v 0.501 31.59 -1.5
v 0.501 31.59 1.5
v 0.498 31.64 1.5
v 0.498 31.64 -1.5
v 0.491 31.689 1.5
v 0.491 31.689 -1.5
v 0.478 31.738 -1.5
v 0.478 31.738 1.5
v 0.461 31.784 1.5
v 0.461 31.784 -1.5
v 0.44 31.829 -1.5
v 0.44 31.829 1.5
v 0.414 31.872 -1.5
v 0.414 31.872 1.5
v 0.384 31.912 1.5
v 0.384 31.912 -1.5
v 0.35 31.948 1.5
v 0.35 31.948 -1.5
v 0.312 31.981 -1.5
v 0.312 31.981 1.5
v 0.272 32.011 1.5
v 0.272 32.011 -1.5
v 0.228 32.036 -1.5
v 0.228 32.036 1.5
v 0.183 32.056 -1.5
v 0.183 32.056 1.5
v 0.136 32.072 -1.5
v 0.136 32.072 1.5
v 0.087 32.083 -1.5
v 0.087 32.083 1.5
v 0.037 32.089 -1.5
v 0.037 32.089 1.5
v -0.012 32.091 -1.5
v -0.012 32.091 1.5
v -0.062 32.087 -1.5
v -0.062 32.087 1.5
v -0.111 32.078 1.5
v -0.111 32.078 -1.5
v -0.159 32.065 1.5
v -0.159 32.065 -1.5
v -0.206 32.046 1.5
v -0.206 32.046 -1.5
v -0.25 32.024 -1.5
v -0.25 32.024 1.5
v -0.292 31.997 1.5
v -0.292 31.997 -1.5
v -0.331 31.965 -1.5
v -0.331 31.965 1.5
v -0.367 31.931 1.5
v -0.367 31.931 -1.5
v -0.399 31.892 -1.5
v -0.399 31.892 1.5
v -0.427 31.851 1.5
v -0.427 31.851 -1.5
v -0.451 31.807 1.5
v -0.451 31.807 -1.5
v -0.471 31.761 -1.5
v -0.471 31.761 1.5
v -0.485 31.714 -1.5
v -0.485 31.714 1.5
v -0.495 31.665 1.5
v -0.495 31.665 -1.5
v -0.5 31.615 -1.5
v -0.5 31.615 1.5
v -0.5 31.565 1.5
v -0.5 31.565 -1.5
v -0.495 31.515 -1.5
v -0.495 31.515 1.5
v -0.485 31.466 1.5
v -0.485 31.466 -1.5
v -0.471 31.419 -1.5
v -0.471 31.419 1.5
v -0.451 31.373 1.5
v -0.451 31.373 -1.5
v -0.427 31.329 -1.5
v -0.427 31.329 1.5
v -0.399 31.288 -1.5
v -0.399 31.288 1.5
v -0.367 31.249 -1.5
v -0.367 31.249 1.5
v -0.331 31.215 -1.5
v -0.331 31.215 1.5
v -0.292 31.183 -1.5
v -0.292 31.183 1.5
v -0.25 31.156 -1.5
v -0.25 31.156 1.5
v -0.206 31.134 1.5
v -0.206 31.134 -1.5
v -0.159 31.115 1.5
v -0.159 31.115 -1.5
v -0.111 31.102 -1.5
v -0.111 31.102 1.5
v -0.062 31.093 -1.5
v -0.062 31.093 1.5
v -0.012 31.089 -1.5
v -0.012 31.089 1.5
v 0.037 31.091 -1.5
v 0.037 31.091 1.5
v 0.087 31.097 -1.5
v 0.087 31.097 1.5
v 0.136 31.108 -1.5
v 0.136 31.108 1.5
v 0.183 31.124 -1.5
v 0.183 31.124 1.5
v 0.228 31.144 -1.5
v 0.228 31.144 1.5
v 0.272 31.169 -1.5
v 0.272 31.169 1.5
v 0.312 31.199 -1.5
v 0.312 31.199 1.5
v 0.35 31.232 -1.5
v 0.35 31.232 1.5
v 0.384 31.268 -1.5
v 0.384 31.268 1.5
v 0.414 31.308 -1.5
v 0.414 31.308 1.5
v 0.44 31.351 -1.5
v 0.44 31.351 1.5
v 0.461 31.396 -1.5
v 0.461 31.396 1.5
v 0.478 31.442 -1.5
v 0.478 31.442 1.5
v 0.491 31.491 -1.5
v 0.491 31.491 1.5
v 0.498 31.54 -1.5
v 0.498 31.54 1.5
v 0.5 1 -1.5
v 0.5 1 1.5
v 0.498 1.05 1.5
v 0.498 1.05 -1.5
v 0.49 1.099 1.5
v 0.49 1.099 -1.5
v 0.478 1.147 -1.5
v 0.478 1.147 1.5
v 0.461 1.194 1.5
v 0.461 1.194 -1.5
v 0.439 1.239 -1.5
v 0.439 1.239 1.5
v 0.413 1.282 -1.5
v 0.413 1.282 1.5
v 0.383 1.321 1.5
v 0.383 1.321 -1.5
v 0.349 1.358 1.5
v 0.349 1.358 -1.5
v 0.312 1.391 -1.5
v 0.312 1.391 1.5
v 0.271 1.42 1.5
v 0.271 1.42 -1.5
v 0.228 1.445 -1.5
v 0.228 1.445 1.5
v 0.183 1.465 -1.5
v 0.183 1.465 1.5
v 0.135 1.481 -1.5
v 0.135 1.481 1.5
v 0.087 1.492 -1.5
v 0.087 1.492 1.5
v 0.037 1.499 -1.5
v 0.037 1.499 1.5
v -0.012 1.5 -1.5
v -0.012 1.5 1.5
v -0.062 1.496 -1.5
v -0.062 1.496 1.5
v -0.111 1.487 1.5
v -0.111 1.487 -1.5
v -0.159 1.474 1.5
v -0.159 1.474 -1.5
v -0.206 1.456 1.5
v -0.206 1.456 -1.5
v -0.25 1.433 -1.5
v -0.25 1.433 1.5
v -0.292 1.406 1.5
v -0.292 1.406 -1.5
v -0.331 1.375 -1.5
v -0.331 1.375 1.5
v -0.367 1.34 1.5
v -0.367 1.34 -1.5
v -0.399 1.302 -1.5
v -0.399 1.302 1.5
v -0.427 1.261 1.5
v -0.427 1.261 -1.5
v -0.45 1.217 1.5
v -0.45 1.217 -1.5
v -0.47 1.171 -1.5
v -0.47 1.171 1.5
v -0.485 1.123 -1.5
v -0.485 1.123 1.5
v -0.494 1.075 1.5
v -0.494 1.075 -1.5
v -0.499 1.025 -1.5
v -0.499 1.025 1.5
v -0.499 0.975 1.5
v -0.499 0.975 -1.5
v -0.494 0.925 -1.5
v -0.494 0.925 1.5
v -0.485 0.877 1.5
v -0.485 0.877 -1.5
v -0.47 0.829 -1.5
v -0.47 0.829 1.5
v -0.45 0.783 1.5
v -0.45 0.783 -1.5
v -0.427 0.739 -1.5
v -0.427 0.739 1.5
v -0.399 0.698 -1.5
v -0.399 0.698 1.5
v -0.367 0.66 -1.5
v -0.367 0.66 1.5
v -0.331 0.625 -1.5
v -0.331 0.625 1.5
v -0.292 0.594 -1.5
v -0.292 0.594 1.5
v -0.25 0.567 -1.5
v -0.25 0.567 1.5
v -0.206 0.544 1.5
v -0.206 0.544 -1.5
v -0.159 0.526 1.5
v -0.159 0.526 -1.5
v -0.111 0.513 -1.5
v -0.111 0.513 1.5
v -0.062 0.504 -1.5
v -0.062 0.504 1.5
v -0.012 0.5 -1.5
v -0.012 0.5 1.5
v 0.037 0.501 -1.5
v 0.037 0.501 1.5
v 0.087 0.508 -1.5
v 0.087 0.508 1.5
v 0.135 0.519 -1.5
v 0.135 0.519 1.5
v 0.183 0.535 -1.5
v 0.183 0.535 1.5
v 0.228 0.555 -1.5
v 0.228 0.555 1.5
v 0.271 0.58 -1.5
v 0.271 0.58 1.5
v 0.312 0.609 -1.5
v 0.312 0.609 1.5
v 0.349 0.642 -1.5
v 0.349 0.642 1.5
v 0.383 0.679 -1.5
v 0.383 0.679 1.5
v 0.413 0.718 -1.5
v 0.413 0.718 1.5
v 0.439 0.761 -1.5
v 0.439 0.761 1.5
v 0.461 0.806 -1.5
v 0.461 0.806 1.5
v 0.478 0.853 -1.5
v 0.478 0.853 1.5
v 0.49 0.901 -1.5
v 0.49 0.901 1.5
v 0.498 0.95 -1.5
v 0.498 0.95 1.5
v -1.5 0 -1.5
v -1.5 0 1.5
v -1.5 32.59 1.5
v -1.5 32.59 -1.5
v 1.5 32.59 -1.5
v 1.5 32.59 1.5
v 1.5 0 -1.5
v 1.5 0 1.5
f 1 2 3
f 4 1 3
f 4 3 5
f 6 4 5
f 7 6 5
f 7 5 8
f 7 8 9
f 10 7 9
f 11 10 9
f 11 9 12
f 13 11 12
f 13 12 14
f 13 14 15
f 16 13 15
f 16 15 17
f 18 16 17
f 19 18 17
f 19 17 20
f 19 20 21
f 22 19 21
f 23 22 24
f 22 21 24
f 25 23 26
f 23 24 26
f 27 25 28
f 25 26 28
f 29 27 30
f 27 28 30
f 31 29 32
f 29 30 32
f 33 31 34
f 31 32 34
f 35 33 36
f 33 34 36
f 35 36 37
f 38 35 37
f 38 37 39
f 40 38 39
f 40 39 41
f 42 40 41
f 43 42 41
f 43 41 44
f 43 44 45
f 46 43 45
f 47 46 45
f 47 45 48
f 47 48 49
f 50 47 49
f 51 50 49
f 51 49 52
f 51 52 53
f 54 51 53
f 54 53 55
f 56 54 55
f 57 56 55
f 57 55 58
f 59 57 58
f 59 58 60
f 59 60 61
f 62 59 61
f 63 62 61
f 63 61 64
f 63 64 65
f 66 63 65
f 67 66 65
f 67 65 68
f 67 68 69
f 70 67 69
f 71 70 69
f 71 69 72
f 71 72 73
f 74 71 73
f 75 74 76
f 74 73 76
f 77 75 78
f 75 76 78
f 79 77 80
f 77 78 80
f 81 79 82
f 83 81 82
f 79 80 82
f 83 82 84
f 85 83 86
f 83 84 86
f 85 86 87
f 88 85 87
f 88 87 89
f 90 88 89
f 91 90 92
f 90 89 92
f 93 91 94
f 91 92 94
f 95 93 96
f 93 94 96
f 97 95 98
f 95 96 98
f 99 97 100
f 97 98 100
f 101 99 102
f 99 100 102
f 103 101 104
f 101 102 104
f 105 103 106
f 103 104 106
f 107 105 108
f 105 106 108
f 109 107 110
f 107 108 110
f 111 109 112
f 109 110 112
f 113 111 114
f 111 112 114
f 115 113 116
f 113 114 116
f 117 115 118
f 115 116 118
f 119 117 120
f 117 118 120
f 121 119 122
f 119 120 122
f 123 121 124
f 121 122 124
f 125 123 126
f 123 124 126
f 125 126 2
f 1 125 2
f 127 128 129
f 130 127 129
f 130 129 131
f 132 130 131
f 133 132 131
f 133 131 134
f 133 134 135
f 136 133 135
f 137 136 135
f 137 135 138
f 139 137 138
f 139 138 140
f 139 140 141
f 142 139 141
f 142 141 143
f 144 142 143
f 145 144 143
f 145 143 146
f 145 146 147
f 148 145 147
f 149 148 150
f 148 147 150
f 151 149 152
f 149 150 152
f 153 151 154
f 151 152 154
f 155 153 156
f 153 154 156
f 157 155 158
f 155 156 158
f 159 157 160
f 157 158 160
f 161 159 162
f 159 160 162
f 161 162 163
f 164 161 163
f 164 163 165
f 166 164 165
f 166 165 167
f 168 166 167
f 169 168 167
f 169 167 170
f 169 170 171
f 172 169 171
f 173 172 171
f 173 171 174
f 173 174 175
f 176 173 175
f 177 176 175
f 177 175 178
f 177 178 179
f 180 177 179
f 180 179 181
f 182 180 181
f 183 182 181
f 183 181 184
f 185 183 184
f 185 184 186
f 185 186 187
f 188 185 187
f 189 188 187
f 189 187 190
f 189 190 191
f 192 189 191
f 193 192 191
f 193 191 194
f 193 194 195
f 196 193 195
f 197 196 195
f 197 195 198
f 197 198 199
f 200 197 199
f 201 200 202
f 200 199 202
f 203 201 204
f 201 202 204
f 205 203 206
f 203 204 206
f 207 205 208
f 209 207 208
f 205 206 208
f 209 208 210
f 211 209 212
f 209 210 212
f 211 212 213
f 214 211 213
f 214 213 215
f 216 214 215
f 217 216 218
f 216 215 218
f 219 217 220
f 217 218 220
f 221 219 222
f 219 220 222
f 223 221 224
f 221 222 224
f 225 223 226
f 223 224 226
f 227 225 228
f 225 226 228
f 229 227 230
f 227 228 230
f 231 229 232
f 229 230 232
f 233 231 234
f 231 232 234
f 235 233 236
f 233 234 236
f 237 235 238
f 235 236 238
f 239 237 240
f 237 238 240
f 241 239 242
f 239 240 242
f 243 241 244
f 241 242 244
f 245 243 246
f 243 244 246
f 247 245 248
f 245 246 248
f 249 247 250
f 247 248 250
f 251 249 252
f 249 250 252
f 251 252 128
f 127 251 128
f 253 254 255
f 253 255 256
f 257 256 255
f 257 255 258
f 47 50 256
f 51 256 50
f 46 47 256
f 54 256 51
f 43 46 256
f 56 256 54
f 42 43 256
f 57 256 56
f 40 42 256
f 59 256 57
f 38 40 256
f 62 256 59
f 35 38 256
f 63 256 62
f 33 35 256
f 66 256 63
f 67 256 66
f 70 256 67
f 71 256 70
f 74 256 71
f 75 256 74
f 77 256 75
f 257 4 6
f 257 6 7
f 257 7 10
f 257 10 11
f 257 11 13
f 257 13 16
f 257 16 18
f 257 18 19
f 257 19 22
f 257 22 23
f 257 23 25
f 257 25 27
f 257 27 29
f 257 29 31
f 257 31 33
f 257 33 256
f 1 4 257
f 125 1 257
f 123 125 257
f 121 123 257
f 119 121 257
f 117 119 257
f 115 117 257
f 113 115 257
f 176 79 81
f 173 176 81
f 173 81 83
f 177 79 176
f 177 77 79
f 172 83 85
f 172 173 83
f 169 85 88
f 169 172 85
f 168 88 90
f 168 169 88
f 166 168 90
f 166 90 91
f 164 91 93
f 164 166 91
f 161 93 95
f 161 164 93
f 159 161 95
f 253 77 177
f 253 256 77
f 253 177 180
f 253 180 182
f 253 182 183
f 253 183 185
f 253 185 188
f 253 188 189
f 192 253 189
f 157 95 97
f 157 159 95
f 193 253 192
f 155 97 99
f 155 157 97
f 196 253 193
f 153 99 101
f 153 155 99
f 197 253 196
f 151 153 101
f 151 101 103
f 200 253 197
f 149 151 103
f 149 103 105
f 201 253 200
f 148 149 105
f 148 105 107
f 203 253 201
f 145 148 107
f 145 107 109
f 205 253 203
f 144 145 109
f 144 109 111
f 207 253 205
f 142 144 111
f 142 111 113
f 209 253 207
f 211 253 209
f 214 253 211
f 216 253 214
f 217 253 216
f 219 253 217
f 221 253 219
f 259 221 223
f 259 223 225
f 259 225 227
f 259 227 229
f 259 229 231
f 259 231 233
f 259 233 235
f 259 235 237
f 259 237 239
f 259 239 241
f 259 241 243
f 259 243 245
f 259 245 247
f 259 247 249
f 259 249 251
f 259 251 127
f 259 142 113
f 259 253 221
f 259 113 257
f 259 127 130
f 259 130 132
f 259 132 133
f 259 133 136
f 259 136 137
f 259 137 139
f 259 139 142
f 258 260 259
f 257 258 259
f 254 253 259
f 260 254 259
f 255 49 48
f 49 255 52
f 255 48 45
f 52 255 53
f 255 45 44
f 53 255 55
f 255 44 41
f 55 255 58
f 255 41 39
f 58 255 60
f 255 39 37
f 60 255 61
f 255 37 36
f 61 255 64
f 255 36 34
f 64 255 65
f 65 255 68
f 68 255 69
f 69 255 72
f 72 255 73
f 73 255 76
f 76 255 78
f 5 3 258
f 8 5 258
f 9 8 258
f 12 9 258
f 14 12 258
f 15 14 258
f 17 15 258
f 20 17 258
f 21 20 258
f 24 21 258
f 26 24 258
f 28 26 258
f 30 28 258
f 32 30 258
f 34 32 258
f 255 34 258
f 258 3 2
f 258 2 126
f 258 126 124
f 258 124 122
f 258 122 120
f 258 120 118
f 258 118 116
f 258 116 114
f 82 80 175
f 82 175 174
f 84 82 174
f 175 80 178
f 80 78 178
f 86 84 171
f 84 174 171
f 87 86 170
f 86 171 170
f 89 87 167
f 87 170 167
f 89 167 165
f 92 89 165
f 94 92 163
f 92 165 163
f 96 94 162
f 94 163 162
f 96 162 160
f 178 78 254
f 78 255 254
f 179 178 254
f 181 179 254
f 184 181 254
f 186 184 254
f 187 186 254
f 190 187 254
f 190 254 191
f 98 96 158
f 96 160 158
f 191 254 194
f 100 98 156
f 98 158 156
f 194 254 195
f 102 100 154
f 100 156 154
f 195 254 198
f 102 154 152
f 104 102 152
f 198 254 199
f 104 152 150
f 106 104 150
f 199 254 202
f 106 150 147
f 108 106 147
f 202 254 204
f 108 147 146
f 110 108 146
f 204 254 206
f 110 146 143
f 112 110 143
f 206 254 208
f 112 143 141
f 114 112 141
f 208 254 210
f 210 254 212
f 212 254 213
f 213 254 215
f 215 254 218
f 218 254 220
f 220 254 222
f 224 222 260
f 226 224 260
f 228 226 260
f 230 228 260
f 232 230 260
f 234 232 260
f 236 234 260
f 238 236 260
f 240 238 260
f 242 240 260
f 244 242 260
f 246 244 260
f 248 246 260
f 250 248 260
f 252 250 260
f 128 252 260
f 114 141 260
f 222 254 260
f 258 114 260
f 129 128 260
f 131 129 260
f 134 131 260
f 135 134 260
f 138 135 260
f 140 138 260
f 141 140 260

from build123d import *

# Parameters (mm, degrees)
SKETCH1_W           = 3
SKETCH1_H           = 3
BOSS_EXTRUDE1_DEPTH = 32.59
SKETCH2_R           = 0.5
CUT_EXTRUDE1_DEPTH  = 4
CUT_EXTRUDE2_REACH  = 5
SKETCH3_R           = 0.500716242


with BuildPart() as part:
    # Sketch1 → Boss-Extrude1 (new body)
    with BuildSketch(Plane(origin=(0, 0, 0), x_dir=(1, 0, 0), z_dir=(0, 1, 0))):
        Rectangle(SKETCH1_W, SKETCH1_H)
    extrude(amount=BOSS_EXTRUDE1_DEPTH)

    # Sketch2 → Cut-Extrude1 (cut, through all)
    with BuildSketch(Plane.XY.offset(1.5)):
        with Locations((0, 1)):
            Circle(SKETCH2_R)
    extrude(amount=-CUT_EXTRUDE1_DEPTH, mode=Mode.SUBTRACT)

    # Sketch3 → Cut-Extrude2 (cut, up to next)
    with BuildSketch(Plane.XY.offset(1.5), mode=Mode.PRIVATE) as cut_extrude2_sk1:
        with Locations((0, 31.59)):
            Circle(SKETCH3_R)
    cut_extrude2_tool1 = extrude(cut_extrude2_sk1.sketch, amount=-CUT_EXTRUDE2_REACH, mode=Mode.PRIVATE) & part.part
    add(cut_extrude2_tool1.solids().sort_by_distance((0, 31.59, 1.5))[0], mode=Mode.SUBTRACT)


solid = part.part
